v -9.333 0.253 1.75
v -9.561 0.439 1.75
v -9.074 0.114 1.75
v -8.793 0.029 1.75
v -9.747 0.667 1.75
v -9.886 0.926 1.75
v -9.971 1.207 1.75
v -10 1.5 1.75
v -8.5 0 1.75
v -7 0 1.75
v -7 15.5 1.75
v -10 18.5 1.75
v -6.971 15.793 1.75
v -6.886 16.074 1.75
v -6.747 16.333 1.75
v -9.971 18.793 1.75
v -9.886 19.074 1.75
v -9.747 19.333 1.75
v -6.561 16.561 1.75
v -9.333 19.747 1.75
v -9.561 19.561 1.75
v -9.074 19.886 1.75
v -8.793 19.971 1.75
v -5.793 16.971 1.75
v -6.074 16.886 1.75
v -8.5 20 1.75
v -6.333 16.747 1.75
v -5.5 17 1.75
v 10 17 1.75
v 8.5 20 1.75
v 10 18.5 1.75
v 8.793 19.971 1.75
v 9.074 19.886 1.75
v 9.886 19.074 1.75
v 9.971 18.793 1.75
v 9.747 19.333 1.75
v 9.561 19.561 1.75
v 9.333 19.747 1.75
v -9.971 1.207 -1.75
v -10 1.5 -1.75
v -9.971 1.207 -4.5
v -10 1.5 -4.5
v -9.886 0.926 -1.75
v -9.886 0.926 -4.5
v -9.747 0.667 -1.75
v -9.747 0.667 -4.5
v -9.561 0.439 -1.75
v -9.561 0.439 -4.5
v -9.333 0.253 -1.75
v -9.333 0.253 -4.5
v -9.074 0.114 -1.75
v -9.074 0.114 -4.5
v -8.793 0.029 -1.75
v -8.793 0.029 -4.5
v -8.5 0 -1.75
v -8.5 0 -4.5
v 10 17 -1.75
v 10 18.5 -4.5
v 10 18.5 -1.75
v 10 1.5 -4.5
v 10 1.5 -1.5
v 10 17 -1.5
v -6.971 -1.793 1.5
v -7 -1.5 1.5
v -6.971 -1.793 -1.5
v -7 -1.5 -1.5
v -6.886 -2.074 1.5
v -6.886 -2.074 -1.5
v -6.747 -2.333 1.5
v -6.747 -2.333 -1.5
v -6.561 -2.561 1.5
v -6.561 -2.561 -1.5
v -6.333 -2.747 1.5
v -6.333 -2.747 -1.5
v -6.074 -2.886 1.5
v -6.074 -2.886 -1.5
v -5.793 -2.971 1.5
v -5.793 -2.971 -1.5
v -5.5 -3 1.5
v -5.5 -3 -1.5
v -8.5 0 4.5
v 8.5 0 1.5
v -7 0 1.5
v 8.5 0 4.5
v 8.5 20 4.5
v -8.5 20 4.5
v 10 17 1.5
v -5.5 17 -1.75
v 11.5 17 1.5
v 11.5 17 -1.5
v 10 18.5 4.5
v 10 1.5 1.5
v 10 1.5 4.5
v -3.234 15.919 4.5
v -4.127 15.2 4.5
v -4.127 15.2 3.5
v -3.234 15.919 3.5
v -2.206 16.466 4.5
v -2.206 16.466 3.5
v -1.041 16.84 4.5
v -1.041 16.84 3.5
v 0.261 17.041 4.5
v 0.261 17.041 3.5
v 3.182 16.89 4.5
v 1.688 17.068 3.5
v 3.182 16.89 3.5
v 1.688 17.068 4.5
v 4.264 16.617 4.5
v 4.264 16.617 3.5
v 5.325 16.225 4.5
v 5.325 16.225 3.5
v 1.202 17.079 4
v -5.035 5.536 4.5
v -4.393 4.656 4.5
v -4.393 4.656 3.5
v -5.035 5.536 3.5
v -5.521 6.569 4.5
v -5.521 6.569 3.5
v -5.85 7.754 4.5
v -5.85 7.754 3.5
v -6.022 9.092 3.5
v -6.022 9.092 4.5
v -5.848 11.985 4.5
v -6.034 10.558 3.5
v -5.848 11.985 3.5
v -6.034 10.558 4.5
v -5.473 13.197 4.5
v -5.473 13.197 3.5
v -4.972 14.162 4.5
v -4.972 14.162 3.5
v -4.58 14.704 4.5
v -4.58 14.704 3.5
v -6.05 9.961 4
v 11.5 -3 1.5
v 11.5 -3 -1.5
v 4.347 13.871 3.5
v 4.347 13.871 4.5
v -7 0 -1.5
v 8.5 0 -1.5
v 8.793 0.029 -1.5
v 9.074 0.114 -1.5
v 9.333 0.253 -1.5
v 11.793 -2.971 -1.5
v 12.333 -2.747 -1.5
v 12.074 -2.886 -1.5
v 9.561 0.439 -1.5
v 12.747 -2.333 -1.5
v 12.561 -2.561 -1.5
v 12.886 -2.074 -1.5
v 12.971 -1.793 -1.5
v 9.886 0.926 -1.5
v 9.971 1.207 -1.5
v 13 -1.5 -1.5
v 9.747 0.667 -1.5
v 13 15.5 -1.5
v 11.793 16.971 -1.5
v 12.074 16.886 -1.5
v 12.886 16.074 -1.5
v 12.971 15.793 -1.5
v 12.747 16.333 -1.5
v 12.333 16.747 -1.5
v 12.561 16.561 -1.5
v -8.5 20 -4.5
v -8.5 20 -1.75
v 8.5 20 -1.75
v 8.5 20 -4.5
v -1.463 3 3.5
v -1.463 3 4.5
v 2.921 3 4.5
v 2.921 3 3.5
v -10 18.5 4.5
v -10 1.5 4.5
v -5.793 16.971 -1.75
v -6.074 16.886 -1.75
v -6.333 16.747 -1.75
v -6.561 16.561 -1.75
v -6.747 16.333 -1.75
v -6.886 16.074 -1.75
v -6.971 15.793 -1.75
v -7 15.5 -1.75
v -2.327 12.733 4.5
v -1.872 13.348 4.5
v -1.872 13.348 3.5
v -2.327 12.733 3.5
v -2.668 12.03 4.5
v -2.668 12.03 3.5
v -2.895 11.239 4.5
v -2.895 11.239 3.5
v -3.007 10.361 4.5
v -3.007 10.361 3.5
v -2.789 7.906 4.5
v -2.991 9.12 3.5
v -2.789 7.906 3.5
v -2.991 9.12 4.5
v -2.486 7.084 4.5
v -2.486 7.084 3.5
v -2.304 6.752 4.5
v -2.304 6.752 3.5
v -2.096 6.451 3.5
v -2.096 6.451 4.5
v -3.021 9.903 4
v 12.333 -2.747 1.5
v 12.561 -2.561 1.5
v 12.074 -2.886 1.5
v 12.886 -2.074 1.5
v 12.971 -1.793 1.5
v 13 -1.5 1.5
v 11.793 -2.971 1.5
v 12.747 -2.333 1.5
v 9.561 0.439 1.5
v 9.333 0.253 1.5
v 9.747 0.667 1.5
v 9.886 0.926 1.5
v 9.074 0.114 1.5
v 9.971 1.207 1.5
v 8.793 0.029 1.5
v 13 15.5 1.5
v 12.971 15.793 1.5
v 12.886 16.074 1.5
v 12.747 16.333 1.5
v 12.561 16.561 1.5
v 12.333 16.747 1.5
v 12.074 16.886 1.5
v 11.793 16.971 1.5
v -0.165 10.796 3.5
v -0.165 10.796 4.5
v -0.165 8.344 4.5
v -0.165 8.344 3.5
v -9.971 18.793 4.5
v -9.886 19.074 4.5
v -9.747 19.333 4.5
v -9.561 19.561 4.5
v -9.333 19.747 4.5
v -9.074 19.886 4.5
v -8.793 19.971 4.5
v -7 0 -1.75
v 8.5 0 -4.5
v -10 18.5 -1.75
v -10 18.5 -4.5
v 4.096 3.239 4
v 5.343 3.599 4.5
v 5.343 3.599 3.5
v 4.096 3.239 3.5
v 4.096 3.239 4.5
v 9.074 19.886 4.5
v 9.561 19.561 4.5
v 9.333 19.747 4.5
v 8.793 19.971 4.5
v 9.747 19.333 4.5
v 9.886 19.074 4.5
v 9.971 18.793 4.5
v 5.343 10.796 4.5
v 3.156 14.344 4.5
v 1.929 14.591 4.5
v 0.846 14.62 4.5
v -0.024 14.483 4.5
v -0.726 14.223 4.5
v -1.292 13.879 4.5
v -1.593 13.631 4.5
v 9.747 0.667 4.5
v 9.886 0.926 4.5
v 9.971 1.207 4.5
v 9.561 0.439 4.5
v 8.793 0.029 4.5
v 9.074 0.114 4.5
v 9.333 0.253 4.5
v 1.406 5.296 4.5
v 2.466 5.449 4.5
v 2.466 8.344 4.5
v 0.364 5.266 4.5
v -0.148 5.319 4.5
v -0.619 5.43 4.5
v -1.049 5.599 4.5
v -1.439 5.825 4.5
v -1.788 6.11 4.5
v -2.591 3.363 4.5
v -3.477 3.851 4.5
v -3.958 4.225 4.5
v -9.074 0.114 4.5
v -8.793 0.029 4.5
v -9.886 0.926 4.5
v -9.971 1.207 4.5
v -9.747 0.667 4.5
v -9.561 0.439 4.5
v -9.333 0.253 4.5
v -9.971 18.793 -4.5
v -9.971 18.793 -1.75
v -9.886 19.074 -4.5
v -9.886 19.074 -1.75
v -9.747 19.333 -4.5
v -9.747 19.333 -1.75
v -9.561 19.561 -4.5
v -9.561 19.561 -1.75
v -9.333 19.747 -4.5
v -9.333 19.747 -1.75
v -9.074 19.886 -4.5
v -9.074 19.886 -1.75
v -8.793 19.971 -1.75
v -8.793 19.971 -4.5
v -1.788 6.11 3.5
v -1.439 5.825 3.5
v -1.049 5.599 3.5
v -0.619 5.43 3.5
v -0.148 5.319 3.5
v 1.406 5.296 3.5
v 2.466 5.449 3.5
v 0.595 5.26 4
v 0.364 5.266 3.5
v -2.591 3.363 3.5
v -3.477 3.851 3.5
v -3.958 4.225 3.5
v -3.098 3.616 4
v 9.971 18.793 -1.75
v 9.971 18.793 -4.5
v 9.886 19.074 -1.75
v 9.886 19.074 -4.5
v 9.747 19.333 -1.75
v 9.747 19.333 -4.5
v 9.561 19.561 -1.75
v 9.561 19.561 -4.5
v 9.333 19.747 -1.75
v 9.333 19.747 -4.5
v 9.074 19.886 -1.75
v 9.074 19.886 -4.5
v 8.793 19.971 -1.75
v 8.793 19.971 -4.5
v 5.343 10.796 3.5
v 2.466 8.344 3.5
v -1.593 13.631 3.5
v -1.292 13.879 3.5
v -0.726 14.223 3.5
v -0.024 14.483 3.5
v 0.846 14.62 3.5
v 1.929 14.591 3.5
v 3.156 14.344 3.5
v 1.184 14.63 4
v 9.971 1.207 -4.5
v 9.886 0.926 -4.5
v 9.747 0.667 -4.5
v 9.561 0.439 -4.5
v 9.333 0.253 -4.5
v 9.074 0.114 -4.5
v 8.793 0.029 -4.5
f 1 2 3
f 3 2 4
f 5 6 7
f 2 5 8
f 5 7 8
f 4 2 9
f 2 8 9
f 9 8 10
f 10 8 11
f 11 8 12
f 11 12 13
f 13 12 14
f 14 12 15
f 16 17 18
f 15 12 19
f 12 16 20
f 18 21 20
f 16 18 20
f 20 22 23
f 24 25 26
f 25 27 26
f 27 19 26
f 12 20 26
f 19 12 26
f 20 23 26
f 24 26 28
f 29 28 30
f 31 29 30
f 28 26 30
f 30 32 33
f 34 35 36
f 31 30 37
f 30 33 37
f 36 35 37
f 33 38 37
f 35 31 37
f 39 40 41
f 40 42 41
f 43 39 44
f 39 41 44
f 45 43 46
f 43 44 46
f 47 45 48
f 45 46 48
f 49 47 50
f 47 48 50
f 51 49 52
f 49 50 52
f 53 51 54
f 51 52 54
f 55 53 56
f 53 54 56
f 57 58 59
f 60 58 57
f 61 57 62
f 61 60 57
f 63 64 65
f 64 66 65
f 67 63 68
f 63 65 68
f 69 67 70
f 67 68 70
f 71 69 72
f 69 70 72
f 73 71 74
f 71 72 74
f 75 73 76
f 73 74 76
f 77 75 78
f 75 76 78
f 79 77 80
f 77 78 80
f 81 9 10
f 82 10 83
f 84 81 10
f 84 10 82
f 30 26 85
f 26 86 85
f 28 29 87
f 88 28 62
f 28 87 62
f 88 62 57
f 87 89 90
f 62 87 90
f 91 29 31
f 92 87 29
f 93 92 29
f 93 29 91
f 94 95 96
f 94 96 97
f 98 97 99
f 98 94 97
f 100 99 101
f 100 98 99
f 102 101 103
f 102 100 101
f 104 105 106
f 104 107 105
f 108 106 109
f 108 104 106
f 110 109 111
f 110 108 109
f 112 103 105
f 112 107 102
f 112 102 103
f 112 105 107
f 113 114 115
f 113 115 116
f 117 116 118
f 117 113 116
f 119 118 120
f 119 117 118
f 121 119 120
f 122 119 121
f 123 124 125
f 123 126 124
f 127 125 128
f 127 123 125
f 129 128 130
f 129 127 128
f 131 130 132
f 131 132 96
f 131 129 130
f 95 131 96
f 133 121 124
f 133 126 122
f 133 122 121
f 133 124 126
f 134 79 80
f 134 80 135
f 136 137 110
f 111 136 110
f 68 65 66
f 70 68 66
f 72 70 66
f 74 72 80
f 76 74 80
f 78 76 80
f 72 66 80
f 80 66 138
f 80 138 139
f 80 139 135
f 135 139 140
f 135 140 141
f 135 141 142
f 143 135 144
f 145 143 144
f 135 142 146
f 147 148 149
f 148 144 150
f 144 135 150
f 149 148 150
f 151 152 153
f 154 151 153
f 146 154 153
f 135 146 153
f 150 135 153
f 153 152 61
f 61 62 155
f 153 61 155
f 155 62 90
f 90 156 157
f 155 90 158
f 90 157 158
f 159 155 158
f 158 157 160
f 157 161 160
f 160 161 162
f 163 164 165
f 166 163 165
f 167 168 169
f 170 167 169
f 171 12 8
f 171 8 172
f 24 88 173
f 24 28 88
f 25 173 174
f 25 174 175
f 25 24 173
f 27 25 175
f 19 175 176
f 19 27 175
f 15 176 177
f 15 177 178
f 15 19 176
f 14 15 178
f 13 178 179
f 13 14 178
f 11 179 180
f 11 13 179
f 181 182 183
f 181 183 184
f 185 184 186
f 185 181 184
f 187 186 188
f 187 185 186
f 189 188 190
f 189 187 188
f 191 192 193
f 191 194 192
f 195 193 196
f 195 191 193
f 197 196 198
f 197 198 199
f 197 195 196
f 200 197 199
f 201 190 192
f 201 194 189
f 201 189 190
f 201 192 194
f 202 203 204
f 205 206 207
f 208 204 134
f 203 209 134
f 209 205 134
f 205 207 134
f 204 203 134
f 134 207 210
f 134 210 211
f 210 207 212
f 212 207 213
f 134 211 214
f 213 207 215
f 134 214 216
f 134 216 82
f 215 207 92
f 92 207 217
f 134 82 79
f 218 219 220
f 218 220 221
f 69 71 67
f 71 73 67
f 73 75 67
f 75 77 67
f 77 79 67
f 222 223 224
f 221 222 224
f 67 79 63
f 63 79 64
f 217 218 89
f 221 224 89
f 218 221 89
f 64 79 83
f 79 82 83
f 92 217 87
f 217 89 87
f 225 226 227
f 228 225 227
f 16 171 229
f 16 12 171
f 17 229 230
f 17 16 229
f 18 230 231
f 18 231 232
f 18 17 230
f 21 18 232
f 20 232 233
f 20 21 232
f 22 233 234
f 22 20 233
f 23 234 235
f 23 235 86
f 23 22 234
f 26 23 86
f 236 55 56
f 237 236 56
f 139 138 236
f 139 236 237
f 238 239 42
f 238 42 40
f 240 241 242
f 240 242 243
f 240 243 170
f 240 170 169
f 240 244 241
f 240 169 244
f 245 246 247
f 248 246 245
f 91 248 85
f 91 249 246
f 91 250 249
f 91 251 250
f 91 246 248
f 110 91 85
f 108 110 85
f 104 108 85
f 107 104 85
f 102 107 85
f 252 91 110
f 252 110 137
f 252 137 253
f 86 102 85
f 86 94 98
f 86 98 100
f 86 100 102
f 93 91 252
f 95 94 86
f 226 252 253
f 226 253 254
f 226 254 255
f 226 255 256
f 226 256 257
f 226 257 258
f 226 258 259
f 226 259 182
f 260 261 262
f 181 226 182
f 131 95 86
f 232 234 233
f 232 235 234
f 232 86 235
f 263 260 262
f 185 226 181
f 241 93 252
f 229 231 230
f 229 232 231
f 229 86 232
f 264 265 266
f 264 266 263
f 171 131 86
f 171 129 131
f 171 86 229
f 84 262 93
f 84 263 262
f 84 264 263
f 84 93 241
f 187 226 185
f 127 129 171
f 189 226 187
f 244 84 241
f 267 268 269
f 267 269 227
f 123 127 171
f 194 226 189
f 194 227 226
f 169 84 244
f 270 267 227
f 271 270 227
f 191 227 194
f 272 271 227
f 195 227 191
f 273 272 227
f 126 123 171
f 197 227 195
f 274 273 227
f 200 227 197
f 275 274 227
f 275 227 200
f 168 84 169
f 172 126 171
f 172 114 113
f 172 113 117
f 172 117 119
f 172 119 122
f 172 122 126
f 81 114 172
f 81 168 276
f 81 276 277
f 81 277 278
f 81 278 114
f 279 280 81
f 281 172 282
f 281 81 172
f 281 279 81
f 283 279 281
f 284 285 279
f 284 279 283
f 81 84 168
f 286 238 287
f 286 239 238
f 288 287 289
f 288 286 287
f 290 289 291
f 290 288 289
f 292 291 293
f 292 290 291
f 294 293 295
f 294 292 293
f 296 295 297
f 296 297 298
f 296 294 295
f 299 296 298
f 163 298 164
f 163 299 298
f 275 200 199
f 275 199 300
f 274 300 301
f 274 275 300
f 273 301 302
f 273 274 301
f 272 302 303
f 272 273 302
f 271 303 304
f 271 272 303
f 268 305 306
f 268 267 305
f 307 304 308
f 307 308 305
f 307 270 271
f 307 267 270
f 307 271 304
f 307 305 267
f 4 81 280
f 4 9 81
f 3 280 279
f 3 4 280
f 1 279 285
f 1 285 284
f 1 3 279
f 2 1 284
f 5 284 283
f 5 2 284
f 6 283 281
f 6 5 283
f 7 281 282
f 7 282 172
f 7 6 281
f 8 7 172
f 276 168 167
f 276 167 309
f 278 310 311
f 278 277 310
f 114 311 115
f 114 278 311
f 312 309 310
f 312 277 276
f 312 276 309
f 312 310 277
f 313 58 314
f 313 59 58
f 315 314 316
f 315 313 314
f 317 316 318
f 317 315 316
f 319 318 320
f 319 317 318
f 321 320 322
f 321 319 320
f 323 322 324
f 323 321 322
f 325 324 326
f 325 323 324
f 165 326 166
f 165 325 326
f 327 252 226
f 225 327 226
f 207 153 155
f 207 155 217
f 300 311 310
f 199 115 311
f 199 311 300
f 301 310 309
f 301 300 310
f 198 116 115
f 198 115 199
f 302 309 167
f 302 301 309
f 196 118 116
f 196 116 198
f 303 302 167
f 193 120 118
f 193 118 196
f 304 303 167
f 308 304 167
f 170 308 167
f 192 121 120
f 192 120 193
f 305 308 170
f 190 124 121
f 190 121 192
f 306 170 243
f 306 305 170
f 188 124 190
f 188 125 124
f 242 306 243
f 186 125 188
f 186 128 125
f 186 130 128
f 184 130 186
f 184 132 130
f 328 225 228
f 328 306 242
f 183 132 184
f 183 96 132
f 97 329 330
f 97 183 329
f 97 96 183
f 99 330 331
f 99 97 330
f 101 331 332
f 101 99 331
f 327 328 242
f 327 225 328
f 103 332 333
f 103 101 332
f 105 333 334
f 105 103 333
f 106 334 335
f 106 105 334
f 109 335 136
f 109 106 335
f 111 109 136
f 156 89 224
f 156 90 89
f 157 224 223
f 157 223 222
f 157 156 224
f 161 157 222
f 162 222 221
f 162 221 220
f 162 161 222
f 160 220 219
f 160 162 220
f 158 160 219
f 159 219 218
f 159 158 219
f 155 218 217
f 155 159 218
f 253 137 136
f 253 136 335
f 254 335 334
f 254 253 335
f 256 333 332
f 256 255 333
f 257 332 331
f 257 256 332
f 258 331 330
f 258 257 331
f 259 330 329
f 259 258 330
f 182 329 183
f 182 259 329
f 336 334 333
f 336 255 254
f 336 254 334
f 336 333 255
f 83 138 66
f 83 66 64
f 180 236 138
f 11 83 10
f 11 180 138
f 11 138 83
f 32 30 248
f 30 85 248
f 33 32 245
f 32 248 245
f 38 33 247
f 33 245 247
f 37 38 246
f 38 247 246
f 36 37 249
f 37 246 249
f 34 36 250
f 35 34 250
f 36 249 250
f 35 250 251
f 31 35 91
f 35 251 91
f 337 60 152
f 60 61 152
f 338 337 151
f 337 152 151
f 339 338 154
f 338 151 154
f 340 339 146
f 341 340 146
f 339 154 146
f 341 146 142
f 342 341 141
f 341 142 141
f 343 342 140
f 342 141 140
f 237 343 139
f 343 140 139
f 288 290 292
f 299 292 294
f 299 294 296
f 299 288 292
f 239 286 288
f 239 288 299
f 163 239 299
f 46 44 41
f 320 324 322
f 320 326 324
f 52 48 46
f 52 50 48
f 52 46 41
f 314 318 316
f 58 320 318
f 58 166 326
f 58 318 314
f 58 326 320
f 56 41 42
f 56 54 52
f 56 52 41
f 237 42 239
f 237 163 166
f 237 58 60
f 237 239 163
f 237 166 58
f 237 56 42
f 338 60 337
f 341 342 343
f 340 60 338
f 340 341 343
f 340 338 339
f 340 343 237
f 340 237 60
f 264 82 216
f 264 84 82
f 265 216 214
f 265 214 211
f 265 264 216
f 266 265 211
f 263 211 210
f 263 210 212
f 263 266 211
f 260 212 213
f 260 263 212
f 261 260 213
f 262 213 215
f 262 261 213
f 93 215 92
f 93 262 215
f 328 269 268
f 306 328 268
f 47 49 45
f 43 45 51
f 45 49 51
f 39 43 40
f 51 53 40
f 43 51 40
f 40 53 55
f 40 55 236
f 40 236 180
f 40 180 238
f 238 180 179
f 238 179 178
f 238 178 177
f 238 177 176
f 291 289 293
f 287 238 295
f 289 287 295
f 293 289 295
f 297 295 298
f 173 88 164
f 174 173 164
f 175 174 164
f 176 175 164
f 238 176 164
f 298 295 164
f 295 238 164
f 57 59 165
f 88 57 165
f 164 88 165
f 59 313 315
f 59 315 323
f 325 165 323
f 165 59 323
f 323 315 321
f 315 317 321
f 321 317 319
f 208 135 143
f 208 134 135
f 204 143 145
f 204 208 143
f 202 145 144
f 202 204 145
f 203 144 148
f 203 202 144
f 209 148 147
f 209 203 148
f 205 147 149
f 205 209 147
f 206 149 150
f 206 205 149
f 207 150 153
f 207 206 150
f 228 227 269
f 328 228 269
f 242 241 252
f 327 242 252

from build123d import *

# Parameters (mm, degrees)
F0_W     = 14
F0_H     = 3
F0_W_2   = 3
F1_DEPTH = 20
F2_DEPTH = 3
F3_W     = 3
F3_H     = 3
F4_DEPTH = 100
F5_W     = 3
F5_H     = 3.5
F6_DEPTH = 100
F7_R     = 1.5
F9_DEPTH = 1


with BuildPart() as f1:
    # F0 (on Front) → F1 (new body)
    with BuildSketch(Plane.XZ):
        Polygon((10, 1.5), (10, 4.5), (-10, 4.5), (-10, 1.5), (-7, 1.5), (7, 1.5), align=None)
        Rectangle(F0_W, F0_H)
        with Locations((11.5, 0)):
            Rectangle(F0_W_2, F0_H)
        with Locations((8.5, 0)):
            Rectangle(F0_W_2, F0_H)
        with Locations((-8.5, 0)):
            Rectangle(F0_W_2, F0_H)
        Polygon((10, -4.5), (10, -1.5), (7, -1.5), (-7, -1.5), (-10, -1.5), (-10, -4.5), align=None)
    extrude(amount=-F1_DEPTH)

    # F0 (on Front) → F2 (join)
    with BuildSketch(Plane.XZ):
        with Locations((-8.5, 0)):
            Rectangle(F0_W_2, F0_H)
        Rectangle(F0_W, F0_H)
        with Locations((8.5, 0)):
            Rectangle(F0_W_2, F0_H)
        with Locations((11.5, 0)):
            Rectangle(F0_W_2, F0_H)
    extrude(amount=F2_DEPTH)

    # F3 (on face) → F4 (cut)
    with BuildSketch(Plane.YZ.offset(13)):
        Polygon((23, -1.75), (23, 1.75), (17, 1.75), (17, 1.5), (20, 1.5), (20, -1.5), (17, -1.5), (17, -1.75), align=None)
        with Locations((18.5, 0)):
            Rectangle(F3_W, F3_H)
    extrude(amount=-F4_DEPTH, mode=Mode.SUBTRACT)

    # F5 (on face) → F6 (cut)
    with BuildSketch(Plane(origin=(0, 17, 0), x_dir=(-1, 0, 0), z_dir=(0, 1, 0))):
        with Locations((11.5, 0)):
            Rectangle(F5_W, F5_H)
        with Locations((8.5, 0)):
            Rectangle(F5_W, F5_H)
    extrude(amount=-F6_DEPTH, mode=Mode.SUBTRACT)

    # F7
    f7_edges = [f1.edges().sort_by_distance(p)[0] for p in [
        (-7, -3, 0),
        (13, -3, 0),
        (10, 0, 3),
        (10, 0, -3),
        (-10, 0, -3.125),
        (-10, 0, 3.125),
        (-7, 17, 0),
        (-10, 20, 3.125),
        (-10, 20, -3.125),
        (13, 17, 0),
        (10, 20, 3.125),
        (10, 20, -3.125),
    ]]
    fillet(f7_edges, radius=F7_R)

    # F8 (on face) → F9 (cut)
    with BuildSketch(Plane.XY.offset(4.5)):
        with BuildLine():
            Line((-1.4625191229, 3), (2.9206384037, 3))
            add(Edge.make_bspline(
                [(5.3432423682, 3.5985243056), (4.0594142819, 3.1793151345), (2.9206384037, 3)],
                knots=[0, 0, 0, 0.958192391, 0.958192391, 0.958192391], degree=2))
            Line((5.3432423682, 3.5985243056), (5.3432423682, 10.7960069444))
            Line((5.3432423682, 10.7960069444), (-0.1650041596, 10.7960069444))
            Line((-0.1650041596, 10.7960069444), (-0.1650041596, 8.3441840278))
            Line((-0.1650041596, 8.3441840278), (2.4660722293, 8.3441840278))
            Line((2.4660722293, 8.3441840278), (2.4660722293, 5.4487847222))
            add(Edge.make_bspline(
                [(0.5945444515, 5.2604166667), (1.5181555626, 5.2604166667), (2.4660722293, 5.4487847222)],
                knots=[0, 0, 0, 1, 1, 1], degree=2))
            add(Edge.make_bspline(
                [(-2.095776729, 6.4513888889), (-1.1706465207, 5.2604166667), (0.5945444515, 5.2604166667)],
                knots=[0, 0, 0, 1, 1, 1], degree=2))
            add(Edge.make_bspline(
                [(-3.0209069374, 9.9027777778), (-3.0209069374, 7.6423611111), (-2.095776729, 6.4513888889)],
                knots=[0, 0, 0, 1, 1, 1], degree=2))
            add(Edge.make_bspline(
                [(-1.8724694374, 13.3480902778), (-3.0209069374, 12.0659722222), (-3.0209069374, 9.9027777778)],
                knots=[0, 0, 0, 1, 1, 1], degree=2))
            add(Edge.make_bspline(
                [(1.1839541737, 14.6302083333), (-0.7240319374, 14.6302083333), (-1.8724694374, 13.3480902778)],
                knots=[0, 0, 0, 1, 1, 1], degree=2))
            add(Edge.make_bspline(
                [(4.3467145904, 13.8706597222), (2.8276173682, 14.6302083333), (1.1839541737, 14.6302083333)],
                knots=[0, 0, 0, 1, 1, 1], degree=2))
            Line((4.3467145904, 13.8706597222), (5.3250132015, 16.2252604167))
            add(Edge.make_bspline(
                [(1.2021833404, 17.0789930556), (3.3410722293, 17.0789930556), (5.3250132015, 16.2252604167)],
                knots=[0, 0, 0, 1, 1, 1], degree=2))
            add(Edge.make_bspline(
                [(-4.1268097151, 15.1998697917), (-2.2036326318, 17.0789930556), (1.2021833404, 17.0789930556)],
                knots=[0, 0, 0, 1, 1, 1], degree=2))
            add(Edge.make_bspline(
                [(-6.0499867985, 9.9605034722), (-6.0499867985, 13.3207465278), (-4.1268097151, 15.1998697917)],
                knots=[0, 0, 0, 1, 1, 1], degree=2))
            add(Edge.make_bspline(
                [(-4.392651729, 4.6558159722), (-6.0499867985, 6.5030381944), (-6.0499867985, 9.9605034722)],
                knots=[0, 0, 0, 1, 1, 1], degree=2))
            add(Edge.make_bspline(
                [(-1.4625191229, 3), (-3.2688097577, 3.4032111719), (-4.392651729, 4.6558159722)],
                knots=[0.3218981532, 0.3218981532, 0.3218981532, 1, 1, 1], degree=2))
        make_face()
    extrude(amount=-F9_DEPTH, mode=Mode.SUBTRACT)


solid = f1.part
